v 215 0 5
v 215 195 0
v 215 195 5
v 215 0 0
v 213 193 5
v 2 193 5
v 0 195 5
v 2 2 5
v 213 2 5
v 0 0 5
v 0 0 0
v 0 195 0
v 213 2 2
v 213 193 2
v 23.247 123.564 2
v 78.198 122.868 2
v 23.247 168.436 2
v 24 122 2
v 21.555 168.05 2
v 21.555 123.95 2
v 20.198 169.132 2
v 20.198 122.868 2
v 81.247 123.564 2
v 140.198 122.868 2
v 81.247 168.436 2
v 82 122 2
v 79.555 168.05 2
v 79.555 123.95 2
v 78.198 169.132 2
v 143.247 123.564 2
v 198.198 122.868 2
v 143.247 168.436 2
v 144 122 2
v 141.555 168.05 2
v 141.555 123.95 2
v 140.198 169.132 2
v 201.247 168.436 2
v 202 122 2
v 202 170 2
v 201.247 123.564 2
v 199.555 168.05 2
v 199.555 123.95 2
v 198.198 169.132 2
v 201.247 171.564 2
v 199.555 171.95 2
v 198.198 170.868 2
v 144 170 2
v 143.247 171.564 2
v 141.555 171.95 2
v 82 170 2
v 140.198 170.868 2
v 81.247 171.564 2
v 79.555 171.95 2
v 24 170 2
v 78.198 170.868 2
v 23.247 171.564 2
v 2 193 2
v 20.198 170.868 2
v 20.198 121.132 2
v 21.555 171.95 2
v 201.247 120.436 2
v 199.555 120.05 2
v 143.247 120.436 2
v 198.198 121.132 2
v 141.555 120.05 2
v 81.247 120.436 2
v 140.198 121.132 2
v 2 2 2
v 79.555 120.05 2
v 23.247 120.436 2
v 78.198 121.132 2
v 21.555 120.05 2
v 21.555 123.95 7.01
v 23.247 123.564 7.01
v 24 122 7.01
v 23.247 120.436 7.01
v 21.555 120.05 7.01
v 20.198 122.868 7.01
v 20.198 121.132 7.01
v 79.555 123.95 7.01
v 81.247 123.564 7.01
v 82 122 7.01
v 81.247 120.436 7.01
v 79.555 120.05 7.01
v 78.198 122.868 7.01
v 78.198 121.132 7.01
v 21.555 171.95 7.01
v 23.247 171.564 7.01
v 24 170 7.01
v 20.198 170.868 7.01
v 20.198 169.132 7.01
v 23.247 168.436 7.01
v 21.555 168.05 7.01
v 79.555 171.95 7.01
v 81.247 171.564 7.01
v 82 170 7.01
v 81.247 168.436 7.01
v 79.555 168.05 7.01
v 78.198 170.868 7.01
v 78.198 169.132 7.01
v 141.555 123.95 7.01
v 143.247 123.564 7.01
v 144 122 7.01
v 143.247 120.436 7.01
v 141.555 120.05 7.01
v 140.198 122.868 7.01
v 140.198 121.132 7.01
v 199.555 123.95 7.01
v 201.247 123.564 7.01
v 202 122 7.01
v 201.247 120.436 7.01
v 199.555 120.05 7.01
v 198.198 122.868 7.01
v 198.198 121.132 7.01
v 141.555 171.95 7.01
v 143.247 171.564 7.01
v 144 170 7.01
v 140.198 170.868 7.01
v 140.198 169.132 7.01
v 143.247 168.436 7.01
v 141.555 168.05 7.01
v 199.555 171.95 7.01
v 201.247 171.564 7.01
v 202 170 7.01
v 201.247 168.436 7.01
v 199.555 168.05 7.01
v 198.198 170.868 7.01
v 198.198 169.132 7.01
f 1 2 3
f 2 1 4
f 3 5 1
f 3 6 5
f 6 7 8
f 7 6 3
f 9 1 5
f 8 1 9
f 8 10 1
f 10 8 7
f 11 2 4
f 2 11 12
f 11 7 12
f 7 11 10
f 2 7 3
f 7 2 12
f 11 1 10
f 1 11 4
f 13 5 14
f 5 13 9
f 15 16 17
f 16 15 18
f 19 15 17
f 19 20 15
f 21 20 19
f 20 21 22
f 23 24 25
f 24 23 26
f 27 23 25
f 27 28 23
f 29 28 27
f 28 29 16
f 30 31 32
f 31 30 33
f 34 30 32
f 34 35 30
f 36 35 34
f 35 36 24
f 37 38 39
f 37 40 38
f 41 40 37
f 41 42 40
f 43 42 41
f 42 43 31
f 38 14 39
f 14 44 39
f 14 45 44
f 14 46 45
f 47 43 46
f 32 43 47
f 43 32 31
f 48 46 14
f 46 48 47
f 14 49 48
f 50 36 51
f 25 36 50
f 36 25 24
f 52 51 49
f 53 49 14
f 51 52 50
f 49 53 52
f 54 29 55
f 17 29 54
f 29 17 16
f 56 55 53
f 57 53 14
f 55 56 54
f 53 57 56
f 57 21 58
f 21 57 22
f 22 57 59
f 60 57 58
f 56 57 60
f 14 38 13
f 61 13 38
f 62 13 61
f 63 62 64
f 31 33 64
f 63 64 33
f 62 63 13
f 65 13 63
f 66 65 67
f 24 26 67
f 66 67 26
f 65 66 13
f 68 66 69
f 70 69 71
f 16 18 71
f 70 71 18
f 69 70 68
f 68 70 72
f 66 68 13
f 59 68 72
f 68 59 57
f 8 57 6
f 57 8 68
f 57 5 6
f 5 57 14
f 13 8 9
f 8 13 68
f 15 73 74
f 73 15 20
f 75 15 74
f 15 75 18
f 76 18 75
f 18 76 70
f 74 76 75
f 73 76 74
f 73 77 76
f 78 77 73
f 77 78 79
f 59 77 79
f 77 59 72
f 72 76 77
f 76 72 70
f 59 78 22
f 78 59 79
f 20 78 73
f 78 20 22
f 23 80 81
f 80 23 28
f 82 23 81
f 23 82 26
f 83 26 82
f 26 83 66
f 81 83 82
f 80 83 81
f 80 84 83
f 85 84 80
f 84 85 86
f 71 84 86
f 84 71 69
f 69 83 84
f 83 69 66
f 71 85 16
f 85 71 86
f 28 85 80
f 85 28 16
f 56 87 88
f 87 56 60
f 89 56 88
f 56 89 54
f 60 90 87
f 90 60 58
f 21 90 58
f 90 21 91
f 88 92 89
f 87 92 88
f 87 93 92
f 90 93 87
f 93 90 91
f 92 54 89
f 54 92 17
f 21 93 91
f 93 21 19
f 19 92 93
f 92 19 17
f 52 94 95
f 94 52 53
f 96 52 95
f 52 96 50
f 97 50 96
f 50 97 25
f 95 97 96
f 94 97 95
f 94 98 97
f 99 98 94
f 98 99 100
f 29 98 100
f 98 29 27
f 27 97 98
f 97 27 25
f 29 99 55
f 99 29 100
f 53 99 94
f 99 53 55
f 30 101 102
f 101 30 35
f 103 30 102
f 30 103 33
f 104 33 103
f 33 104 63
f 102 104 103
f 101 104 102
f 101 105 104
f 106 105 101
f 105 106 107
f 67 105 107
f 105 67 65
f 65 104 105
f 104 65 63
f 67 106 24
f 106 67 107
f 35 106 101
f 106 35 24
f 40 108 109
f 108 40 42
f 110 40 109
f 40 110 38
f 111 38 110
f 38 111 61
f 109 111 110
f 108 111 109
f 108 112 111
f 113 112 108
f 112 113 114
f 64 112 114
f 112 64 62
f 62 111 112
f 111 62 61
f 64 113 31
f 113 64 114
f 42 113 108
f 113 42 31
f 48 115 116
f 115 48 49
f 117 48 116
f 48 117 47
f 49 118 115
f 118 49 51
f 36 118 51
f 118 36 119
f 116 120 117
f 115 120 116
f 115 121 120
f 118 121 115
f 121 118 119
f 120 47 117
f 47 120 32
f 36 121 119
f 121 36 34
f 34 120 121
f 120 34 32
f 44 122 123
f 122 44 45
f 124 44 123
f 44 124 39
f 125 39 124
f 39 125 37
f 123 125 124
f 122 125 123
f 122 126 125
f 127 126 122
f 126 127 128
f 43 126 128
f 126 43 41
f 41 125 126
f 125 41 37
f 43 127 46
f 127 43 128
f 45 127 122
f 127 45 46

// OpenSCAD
// file: mounts.scad
//mount four pads
echo("LOADING MOUNTS FILE");

eps = 0.01;


module mount4_pads(distX, distY, padD, padH, z0=0) {
    translate([0,      0,      z0]) cylinder(padH, d = padD, center = false);
    translate([distX,  0,      z0]) cylinder(padH, d = padD, center = false);
    translate([0,      distY,  z0]) cylinder(padH, d = padD, center = false);
    translate([distX,  distY,  z0]) cylinder(padH, d = padD, center = false);
}

// Bohrungen (negativer Raum)
module mount4_holes(distX, distY, holeD, depth, z0=0) {
    h = depth + 2*eps;
    translate([0,      0,      z0 - eps]) cylinder(h, d = holeD, center = false);
    translate([distX,  0,      z0 - eps]) cylinder(h, d = holeD, center = false);
    translate([0,      distY,  z0 - eps]) cylinder(h, d = holeD, center = false);
    translate([distX,  distY,  z0 - eps]) cylinder(h, d = holeD, center = false);
}
// file: usvMount.scad
echo("USING PI MOUNT FILE");
use <./mounts.scad>;
usv_mountDistX    = 58;
usv_mountDistY    = 48;
usv_mountHeight   = 5;
usv_mountD        = 4;

module usv_mounts(
    distX = usv_mountDistX,
    distY = usv_mountDistY,
    h     = usv_mountHeight,
    d     = usv_mountD
) {
    mount4_holes(distX, distY, d, h, 0);
}
// file: piMount.scad
echo("USING PI MOUNT FILE");
use <./mounts.scad>;
pi_mountDistX    = 58;
pi_mountDistY    = 48;
pi_mountHeight   = 5;
pi_mountD        = 4;

module pi_mounts(
    distX = pi_mountDistX,
    distY = pi_mountDistY,
    h     = pi_mountHeight,
    d     = pi_mountD
) {
    mount4_holes(distX, distY, d, h, 0);
}
// main file
// bottomcase
use <./piMount.scad>;
use <./usvMount.scad>;


thickness=2;

module bottom(){
difference(){

cube([215,195,5]);
translate([thickness,thickness,thickness])
cube([215-(2*thickness),195-(2*thickness),8]);
}
translate([thickness + 20,thickness + 120,thickness])
pi_mounts();

translate([thickness + 140,thickness + 120,thickness])
usv_mounts();
}

bottom();
